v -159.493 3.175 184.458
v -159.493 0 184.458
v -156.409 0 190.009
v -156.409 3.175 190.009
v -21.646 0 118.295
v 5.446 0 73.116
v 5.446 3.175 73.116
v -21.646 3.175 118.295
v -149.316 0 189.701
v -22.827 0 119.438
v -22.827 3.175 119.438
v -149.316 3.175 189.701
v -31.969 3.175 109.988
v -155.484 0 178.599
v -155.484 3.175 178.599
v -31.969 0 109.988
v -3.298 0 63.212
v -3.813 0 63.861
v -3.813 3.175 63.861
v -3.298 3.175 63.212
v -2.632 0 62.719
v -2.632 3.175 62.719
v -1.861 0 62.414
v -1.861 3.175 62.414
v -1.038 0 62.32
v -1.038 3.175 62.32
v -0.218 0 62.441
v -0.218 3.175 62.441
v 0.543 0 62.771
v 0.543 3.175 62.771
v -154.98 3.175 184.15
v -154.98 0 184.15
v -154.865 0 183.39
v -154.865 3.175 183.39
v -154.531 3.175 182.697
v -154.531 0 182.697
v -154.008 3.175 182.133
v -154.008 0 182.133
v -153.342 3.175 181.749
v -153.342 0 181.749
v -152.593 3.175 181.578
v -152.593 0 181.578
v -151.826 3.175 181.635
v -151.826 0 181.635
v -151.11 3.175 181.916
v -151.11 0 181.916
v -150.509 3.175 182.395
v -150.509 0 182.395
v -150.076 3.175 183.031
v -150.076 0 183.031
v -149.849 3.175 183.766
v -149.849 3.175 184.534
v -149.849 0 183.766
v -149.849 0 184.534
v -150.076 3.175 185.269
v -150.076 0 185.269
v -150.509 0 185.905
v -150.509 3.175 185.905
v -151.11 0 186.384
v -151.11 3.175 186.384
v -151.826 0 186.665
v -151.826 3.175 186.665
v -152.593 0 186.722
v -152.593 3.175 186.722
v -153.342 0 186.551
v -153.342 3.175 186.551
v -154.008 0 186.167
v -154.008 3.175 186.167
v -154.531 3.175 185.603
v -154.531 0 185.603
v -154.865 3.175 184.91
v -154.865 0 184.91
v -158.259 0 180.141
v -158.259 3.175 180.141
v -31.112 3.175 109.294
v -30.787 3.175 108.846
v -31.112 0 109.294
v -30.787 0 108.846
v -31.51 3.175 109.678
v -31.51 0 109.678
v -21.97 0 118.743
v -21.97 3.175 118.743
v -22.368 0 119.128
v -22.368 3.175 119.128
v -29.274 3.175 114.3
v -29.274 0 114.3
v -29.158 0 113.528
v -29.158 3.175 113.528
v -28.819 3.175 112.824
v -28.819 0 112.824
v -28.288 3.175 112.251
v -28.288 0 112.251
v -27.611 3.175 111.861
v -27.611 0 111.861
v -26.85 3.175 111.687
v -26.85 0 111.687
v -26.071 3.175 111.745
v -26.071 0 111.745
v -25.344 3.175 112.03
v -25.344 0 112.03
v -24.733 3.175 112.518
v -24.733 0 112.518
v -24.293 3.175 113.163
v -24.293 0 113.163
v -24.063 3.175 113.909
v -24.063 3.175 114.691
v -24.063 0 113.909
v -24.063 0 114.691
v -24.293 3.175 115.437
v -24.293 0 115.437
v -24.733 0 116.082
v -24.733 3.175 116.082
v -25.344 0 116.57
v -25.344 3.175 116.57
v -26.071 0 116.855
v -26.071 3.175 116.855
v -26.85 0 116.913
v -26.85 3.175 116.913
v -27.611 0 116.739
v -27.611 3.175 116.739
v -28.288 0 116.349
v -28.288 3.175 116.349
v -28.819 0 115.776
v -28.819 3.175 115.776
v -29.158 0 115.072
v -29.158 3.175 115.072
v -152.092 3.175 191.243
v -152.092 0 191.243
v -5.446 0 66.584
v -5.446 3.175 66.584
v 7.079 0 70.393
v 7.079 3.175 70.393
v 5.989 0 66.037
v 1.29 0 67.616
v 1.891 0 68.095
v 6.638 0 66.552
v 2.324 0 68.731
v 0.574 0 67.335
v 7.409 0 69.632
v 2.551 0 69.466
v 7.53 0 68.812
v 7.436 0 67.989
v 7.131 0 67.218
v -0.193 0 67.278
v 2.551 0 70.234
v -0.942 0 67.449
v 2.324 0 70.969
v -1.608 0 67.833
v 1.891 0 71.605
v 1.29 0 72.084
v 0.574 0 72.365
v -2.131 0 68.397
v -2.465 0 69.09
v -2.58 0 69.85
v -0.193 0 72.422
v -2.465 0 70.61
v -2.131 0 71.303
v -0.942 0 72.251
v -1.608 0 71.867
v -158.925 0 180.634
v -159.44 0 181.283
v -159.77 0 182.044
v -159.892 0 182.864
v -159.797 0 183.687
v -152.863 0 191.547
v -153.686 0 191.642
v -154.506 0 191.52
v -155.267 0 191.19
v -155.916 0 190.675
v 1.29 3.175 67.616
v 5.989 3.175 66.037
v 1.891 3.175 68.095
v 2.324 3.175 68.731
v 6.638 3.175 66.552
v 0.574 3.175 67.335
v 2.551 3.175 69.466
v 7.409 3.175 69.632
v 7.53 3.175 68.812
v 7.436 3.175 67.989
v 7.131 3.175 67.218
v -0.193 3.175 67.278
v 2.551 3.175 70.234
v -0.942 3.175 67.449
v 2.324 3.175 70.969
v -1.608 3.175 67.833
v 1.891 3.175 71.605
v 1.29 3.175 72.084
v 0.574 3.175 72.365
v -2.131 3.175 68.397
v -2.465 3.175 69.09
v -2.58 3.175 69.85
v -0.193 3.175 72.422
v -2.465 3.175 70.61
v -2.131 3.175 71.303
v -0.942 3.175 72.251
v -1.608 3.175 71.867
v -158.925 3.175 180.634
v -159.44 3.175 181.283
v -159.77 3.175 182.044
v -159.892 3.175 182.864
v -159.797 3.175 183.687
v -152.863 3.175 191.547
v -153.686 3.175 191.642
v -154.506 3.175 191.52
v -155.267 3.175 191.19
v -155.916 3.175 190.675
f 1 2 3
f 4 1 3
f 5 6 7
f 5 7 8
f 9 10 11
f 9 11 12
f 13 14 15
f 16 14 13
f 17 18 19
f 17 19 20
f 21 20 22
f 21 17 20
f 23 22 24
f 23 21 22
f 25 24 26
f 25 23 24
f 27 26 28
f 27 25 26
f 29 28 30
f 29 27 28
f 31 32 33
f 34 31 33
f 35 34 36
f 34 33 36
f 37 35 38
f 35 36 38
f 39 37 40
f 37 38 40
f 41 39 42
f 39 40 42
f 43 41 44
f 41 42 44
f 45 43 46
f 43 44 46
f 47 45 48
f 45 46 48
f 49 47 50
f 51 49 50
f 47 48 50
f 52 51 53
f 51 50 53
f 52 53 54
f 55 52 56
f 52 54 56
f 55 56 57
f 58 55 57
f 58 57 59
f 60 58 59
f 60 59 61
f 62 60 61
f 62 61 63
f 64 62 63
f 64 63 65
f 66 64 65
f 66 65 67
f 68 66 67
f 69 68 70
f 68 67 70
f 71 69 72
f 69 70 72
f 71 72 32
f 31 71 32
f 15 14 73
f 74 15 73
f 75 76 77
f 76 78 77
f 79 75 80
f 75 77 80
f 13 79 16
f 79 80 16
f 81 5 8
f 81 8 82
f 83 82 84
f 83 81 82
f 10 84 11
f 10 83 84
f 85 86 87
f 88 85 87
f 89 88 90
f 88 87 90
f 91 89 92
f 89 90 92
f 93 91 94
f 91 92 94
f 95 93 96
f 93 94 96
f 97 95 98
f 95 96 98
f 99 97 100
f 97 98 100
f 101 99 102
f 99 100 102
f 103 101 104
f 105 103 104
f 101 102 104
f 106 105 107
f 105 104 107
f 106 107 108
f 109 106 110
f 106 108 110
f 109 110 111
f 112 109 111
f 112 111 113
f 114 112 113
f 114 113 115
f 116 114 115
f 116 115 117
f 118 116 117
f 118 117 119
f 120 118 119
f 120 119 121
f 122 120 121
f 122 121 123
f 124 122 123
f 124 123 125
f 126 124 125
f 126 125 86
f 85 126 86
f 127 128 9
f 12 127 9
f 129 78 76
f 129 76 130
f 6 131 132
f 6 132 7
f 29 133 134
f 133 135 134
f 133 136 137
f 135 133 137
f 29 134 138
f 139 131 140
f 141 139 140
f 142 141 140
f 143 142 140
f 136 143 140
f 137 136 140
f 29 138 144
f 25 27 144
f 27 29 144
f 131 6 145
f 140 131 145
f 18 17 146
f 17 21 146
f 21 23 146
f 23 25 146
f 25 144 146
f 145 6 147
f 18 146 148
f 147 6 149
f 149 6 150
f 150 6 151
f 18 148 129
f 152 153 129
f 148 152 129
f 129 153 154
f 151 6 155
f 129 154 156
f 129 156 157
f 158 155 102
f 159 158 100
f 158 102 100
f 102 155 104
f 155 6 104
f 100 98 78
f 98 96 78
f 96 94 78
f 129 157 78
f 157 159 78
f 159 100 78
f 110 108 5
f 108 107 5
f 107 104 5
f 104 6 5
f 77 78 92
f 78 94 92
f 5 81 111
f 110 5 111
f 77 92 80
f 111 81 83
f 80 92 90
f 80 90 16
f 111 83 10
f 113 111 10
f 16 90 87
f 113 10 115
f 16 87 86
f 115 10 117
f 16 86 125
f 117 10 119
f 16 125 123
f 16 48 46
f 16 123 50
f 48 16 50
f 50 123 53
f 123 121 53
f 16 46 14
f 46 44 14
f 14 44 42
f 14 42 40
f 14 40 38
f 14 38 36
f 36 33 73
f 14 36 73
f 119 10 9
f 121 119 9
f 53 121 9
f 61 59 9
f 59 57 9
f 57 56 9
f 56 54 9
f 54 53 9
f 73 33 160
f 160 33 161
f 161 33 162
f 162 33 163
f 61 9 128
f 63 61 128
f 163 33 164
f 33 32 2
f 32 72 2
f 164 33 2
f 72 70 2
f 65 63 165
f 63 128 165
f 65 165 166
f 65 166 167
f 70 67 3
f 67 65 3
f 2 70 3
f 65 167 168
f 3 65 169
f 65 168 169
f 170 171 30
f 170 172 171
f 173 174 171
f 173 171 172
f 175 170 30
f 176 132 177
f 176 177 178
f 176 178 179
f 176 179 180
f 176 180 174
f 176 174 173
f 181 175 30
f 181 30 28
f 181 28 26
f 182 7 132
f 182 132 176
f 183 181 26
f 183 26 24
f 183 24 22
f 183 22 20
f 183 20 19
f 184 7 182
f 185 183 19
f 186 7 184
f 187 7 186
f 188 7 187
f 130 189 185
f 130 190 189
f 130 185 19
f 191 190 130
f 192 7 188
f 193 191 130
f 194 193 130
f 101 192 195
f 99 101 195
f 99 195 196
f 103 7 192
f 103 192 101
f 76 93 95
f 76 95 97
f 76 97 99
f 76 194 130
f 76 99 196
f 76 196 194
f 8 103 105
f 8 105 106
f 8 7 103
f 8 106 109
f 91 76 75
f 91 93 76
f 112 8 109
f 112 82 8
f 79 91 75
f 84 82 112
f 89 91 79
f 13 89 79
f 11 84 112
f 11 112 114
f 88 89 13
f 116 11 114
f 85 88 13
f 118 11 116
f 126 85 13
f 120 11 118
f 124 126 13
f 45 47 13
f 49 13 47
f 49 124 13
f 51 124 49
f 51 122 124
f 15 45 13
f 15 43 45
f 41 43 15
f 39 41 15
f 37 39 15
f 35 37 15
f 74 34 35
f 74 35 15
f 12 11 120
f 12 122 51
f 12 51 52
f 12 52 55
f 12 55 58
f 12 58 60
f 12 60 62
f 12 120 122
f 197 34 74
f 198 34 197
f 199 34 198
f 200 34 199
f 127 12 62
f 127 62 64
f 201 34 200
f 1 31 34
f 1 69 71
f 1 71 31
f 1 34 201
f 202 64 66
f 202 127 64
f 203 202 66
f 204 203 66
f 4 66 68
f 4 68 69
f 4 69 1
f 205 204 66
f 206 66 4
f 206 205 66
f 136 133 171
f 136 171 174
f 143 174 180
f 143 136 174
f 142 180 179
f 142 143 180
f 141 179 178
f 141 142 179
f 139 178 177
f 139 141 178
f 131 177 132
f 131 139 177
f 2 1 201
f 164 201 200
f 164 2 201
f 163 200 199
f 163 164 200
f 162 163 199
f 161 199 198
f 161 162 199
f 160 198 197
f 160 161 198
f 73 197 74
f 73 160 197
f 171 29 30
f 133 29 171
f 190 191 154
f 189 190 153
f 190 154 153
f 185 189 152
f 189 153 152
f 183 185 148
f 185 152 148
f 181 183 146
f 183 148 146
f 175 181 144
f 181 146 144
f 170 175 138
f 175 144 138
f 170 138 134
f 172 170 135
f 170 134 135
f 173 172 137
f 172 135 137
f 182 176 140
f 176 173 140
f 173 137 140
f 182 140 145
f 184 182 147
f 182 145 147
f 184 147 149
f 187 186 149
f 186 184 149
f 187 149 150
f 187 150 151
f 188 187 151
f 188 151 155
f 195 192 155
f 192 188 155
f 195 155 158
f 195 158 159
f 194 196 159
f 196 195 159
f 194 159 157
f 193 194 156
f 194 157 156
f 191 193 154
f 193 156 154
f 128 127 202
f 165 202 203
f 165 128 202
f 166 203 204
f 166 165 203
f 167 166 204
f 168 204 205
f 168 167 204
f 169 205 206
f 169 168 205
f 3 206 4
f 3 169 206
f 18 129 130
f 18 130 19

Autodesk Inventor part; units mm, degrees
ref_plane "YZ Plane" through (0, 0, 0) normal (1, 0, 0) x (0, 1, 0)
ref_plane "XZ Plane" through (0, 0, 0) normal (0, 1, 0) x (-1, 0, 0)
ref_plane "XY Plane" through (0, 0, 0) normal (0, 0, 1) x (1, 0, 0)
sketch "Sketch1" plane through (0, 0, 0) normal (0, 1, 0) x (-1, 0, 0)
  line L0 (0, 76.2) -> (0, -76.2)
  line L1 (270.7338, 0) -> (-270.7338, 0)
  circle A0 centre (0, 69.85) radius 2.5797
  circle A1 centre (0, 44.45) radius 2.5797
  circle A2 centre (152.4, 158.75) radius 2.5797
  line L2 (158.75, 139.7) -> (158.75, 152.4)
  line L3 (158.75, 152.4) -> (273.05, 152.4)
  line L4 (273.05, 152.4) -> (273.05, 139.7)
  line L5 (273.05, 139.7) -> (158.75, 139.7)
  line L6 (146.05, 155.575) -> (158.75, 155.575)
  line L7 (158.75, 155.575) -> (158.75, 190.5)
  line L8 (158.75, 190.5) -> (146.05, 190.5)
  line L9 (146.05, 190.5) -> (146.05, 155.575)
  line L10 (158.75, 152.4) -> (273.05, 152.4)
  line L11 (273.05, 152.4) -> (273.05, 155.575)
  line L12 (273.05, 155.575) -> (158.75, 155.575)
  line L13 (158.75, 155.575) -> (158.75, 152.4)
  line L14 (158.75, 190.5) -> (273.05, 155.575)
  line L15 (266.7, 157.5153) -> (266.7, 155.575)
  circle A3 centre (152.4, 184.15) radius 2.5797
  circle A4 centre (152.4, 158.75) radius 2.5797
  line L16 (158.75, 155.575) -> (146.05, 155.575)
  line L17 (146.05, 155.575) -> (146.05, 152.4)
  line L18 (146.05, 152.4) -> (158.75, 152.4)
  line L19 (158.75, 152.4) -> (158.75, 155.575)
  line L20 (1.5875, 76.2) -> (-4.7625, 76.2)
  line L21 (-4.7625, 76.2) -> (-4.7625, -76.2)
  line L22 (-4.7625, -76.2) -> (1.5875, -76.2)
  line L23 (4.7625, -73.025) -> (4.7625, -41.275)
  line L24 (1.5875, -76.2) -> (1.5875, 76.2)
  line L25 (-1.5875, -76.2) -> (-1.5875, 76.2)
  circle A5 centre (0, -44.45) radius 2.5797
  circle A6 centre (0, -69.85) radius 2.5797
  line L26 (-4.7625, -38.1) -> (1.5875, -38.1)
  arc A7 (4.7625, -41.275) -> (1.5875, -38.1) centre (1.5875, -41.275) ccw
  arc A8 (1.5875, -76.2) -> (4.7625, -73.025) centre (1.5875, -73.025) ccw
  line L27 (-4.7625, 76.2) -> (4.7625, 76.2)
  line L28 (4.7625, 73.025) -> (4.7625, 41.275)
  line L29 (1.5875, 38.1) -> (-4.7625, 38.1)
  line L30 (-4.7625, 38.1) -> (-4.7625, 76.2)
  circle A9 centre (0, 69.85) radius 2.5797
  circle A10 centre (0, 44.45) radius 2.5797
  arc A11 (4.7625, 73.025) -> (1.5875, 76.2) centre (1.5875, 73.025) ccw
  arc A12 (1.5875, 38.1) -> (4.7625, 41.275) centre (1.5875, 41.275) ccw
  line L31 (152.4, 158.75) -> (27.7437, 90.2444)
  line L32 (27.7437, 90.2444) -> (0, 44.45)
  line L33 (5.4311, 41.1597) -> (-5.4311, 47.7403)
  line L34 (-5.4311, 47.7403) -> (22.7534, 94.2623)
  line L35 (32.6024, 100.1603) -> (38.8737, 96.361)
  line L36 (31.8523, 84.7712) -> (5.4311, 41.1597)
  line L37 (149.3417, 164.315) -> (155.4583, 153.185)
  line L38 (155.4583, 153.185) -> (33.0387, 85.9086)
  line L39 (21.1631, 79.3823) -> (17.6317, 85.8082)
  line L40 (23.9398, 95.3997) -> (149.3417, 164.315)
  arc A13 (23.9398, 95.3997) -> (22.7534, 94.2623) centre (25.4689, 92.6172) ccw
  arc A14 (33.0387, 85.9086) -> (31.8523, 84.7712) centre (34.5678, 83.1261) ccw
  circle A15 centre (152.4, 158.75) radius 2.5797
  circle A16 centre (0, 44.45) radius 2.5797
  line L41 (-5.4311, 47.7403) -> (5.4311, 41.1597)
  line L42 (5.4311, 41.1597) -> (3.7859, 38.4442)
  line L43 (-0.5748, 37.3738) -> (-6.0058, 40.6641)
  line L44 (-7.0762, 45.0248) -> (-5.4311, 47.7403)
  arc A17 (-7.0762, 45.0248) -> (-6.0058, 40.6641) centre (-4.3607, 43.3796) ccw
  arc A18 (-0.5748, 37.3738) -> (3.7859, 38.4442) centre (1.0704, 40.0893) ccw
  line L45 (149.3417, 164.315) -> (155.4583, 153.185)
  line L46 (155.4583, 153.185) -> (158.2408, 154.7141)
  line L47 (159.4942, 159.0258) -> (156.4359, 164.5908)
  line L48 (152.1242, 165.8442) -> (149.3417, 164.315)
  arc A19 (156.4359, 164.5908) -> (152.1242, 165.8442) centre (153.6534, 163.0616) ccw
  arc A20 (158.2408, 154.7141) -> (159.4942, 159.0258) centre (156.7116, 157.4966) ccw
  line L49 (152.4, 184.15) -> (26.6539, 114.3)
  line L50 (26.6539, 114.3) -> (0, 69.85)
  line L51 (5.4459, 66.5844) -> (-5.4459, 73.1156)
  line L52 (-5.4459, 73.1156) -> (21.6455, 118.2952)
  line L53 (31.4676, 124.2379) -> (37.756, 120.4671)
  line L54 (30.7873, 108.8455) -> (5.4459, 66.5844)
  line L55 (149.3165, 189.7011) -> (155.4835, 178.5989)
  line L56 (155.4835, 178.5989) -> (31.9686, 109.9883)
  line L57 (20.1227, 103.4081) -> (16.5622, 109.8179)
  line L58 (22.8267, 119.438) -> (149.3165, 189.7011)
  arc A21 (22.8267, 119.438) -> (21.6455, 118.2952) centre (24.3684, 116.6624) ccw
  arc A22 (31.9686, 109.9883) -> (30.7873, 108.8455) centre (33.5103, 107.2127) ccw
  circle A23 centre (152.4, 184.15) radius 2.5797
  circle A24 centre (26.6539, 114.3) radius 2.5797
  circle A25 centre (0, 69.85) radius 2.5797
  line L59 (-5.4459, 73.1156) -> (5.4459, 66.5844)
  line L60 (5.4459, 66.5844) -> (3.8132, 63.8614)
  line L61 (-0.5426, 62.7713) -> (-5.9886, 66.0368)
  line L62 (-7.0787, 70.3926) -> (-5.4459, 73.1156)
  arc A26 (-7.0787, 70.3926) -> (-5.9886, 66.0368) centre (-4.3558, 68.7598) ccw
  arc A27 (-0.5426, 62.7713) -> (3.8132, 63.8614) centre (1.0902, 65.4942) ccw
  line L63 (149.3165, 189.7011) -> (155.4835, 178.5989)
  line L64 (155.4835, 178.5989) -> (158.2591, 180.1407)
  line L65 (159.4928, 184.458) -> (156.4093, 190.0091)
  line L66 (152.092, 191.2428) -> (149.3165, 189.7011)
  arc A28 (156.4093, 190.0091) -> (152.092, 191.2428) centre (153.6338, 188.4673) ccw
  arc A29 (158.2591, 180.1407) -> (159.4928, 184.458) centre (156.7173, 182.9162) ccw
  line L67 (33.0039, 28.575) -> (33.0039, -28.575)
  line L68 (29.8289, -31.75) -> (23.4789, -31.75)
  line L69 (20.3039, -28.575) -> (20.3039, 28.575)
  line L70 (23.4789, 31.75) -> (29.8289, 31.75)
  line L71 (33.0039, 117.475) -> (33.0039, 22.225)
  line L72 (29.8289, 19.05) -> (23.4789, 19.05)
  line L73 (20.3039, 22.225) -> (20.3039, 117.475)
  line L74 (23.4789, 120.65) -> (29.8289, 120.65)
  circle A30 centre (26.6539, 25.4) radius 2.6206
  circle A31 centre (26.6539, -25.4) radius 2.6206
  circle A32 centre (26.6539, 25.4) radius 2.6206
  circle A33 centre (26.6539, 114.3) radius 2.6206
  arc A34 (33.0039, 28.575) -> (29.8289, 31.75) centre (29.8289, 28.575) ccw
  arc A35 (23.4789, 31.75) -> (20.3039, 28.575) centre (23.4789, 28.575) ccw
  arc A36 (20.3039, -28.575) -> (23.4789, -31.75) centre (23.4789, -28.575) ccw
  arc A37 (29.8289, -31.75) -> (33.0039, -28.575) centre (29.8289, -28.575) ccw
  arc A38 (20.3039, 22.225) -> (23.4789, 19.05) centre (23.4789, 22.225) ccw
  arc A39 (29.8289, 19.05) -> (33.0039, 22.225) centre (29.8289, 22.225) ccw
  arc A40 (33.0039, 117.475) -> (29.8289, 120.65) centre (29.8289, 117.475) ccw
  arc A41 (23.4789, 120.65) -> (20.3039, 117.475) centre (23.4789, 117.475) ccw
  point P0 (0, 0)
  point P1 (0, 0)
  point P2 (0, 44.45)
  point P3 (46.8631, 0)
  point P4 (2.1408, 35.7286)
  point P5 (161.0233, 156.2433)
  point P6 (2.1804, 61.1385)
  point P7 (161.0346, 181.6825)
  point P8 (33.0039, 31.75)
  point P9 (33.0039, -31.75)
  point P10 (33.0039, 120.65)
  point P11 (33.0039, 19.05)
  point P12 (20.3039, 19.05)
  point P13 (33.0039, 0)
  dimension "d4" = 5.1594
  dimension "d11" = 5.1594
  dimension "d17" = 152.4
  dimension "d56" = 12.7
  dimension "d57" = 114.3
  dimension "d58" = 3.175
  dimension "d61" = 6.35
  dimension "d63" = 5.1594
  dimension "d65" = 6.35
  dimension "d66" = 6.35
  dimension "d67" = 6.35
  dimension "d68" = 6.35
  dimension "d69" = 9.525
  dimension "d70" = 152.4
  dimension "d71" = 3.175
  dimension "d72" = 3.175
  dimension "d73" = 25.4
  dimension "d74" = 6.35
  dimension "d75" = 4.7625
  dimension "d76" = 4.7625
  dimension "d77" = 6.35
  dimension "d78" = 3.175
  dimension "d79" = 5.1594
  dimension "d80" = 25.4
  dimension "d81" = 6.35
  dimension "d82" = 4.7625
  dimension "d83" = 4.7625
  dimension "d84" = 6.35
  dimension "d85" = 3.175
  dimension "d89" = 190.5
  dimension "d92" = 150
  dimension "d94" = 142.24
  dimension "d95" = 12.7
  dimension "d96" = 3.175
  dimension "d97" = 6.35
  dimension "d98" = 3.175
  dimension "d99" = 6.35
  dimension "d100" = 3.175
  dimension "d101" = 5.1594
  dimension "d102" = 190.5
  dimension "d103" = 150
  dimension "d105" = 12.7
  dimension "d106" = 3.175
  dimension "d107" = 6.35
  dimension "d108" = 3.175
  dimension "d109" = 6.35
  dimension "d110" = 3.175
  dimension "d111" = 5.1594
  dimension "d112" = 12.7
  dimension "d113" = 12.7
  dimension "d114" = 76.2
  dimension "d115" = 4.7625
  dimension "d116" = 265.9713
  dimension "d117" = 42.1006
  dimension "d118" = 139.7
  dimension "d119" = 88.9
  dimension "d120" = 25.4
  dimension "d121" = 12.7
  dimension "d123" = 12.7
  dimension "d124" = 5.2413
  dimension "d125" = 6.35
  dimension "d126" = 6.35
  dimension "d127" = 6.35
  dimension "d128" = 6.35
sketch "Sketch2" plane through (0, 0, 0) normal (1, 0, 0) x (0, 1, 0)
  line L0 (0, 76.2) -> (0, -76.2)
  line L1 (270.7338, 0) -> (-270.7338, 0)
  circle A0 centre (0, 69.85) radius 2.5797
  circle A1 centre (0, 44.45) radius 2.5797
  circle A2 centre (188.7991, 19.05) radius 2.5797
  line L2 (195.1491, 0) -> (195.1491, 12.7)
  line L3 (195.1491, 12.7) -> (309.4491, 12.7)
  line L4 (309.4491, 12.7) -> (309.4491, 0)
  line L5 (309.4491, 0) -> (195.1491, 0)
  line L6 (182.4491, 15.875) -> (195.1491, 15.875)
  line L7 (195.1491, 15.875) -> (195.1491, 50.8)
  line L8 (195.1491, 50.8) -> (182.4491, 50.8)
  line L9 (182.4491, 50.8) -> (182.4491, 15.875)
  line L10 (195.1491, 12.7) -> (309.4491, 12.7)
  line L11 (309.4491, 12.7) -> (309.4491, 15.875)
  line L12 (309.4491, 15.875) -> (195.1491, 15.875)
  line L13 (195.1491, 15.875) -> (195.1491, 12.7)
  line L14 (195.1491, 50.8) -> (309.4491, 15.875)
  line L15 (303.0991, 17.8153) -> (303.0991, 15.875)
  circle A3 centre (188.7991, 44.45) radius 2.5797
  circle A4 centre (188.7991, 19.05) radius 2.5797
  line L16 (195.1491, 15.875) -> (182.4491, 15.875)
  line L17 (182.4491, 15.875) -> (182.4491, 12.7)
  line L18 (182.4491, 12.7) -> (195.1491, 12.7)
  line L19 (195.1491, 12.7) -> (195.1491, 15.875)
  line L20 (1.5875, 76.2) -> (-4.7625, 76.2)
  line L21 (-4.7625, 76.2) -> (-4.7625, -76.2)
  line L22 (-4.7625, -76.2) -> (1.5875, -76.2)
  line L23 (4.7625, -73.025) -> (4.7625, -41.275)
  line L24 (1.5875, -76.2) -> (1.5875, 76.2)
  line L25 (-1.5875, -76.2) -> (-1.5875, 76.2)
  circle A5 centre (0, -44.45) radius 2.5797
  circle A6 centre (0, -69.85) radius 2.5797
  line L26 (-4.7625, -38.1) -> (1.5875, -38.1)
  arc A7 (4.7625, -41.275) -> (1.5875, -38.1) centre (1.5875, -41.275) ccw
  arc A8 (1.5875, -76.2) -> (4.7625, -73.025) centre (1.5875, -73.025) ccw
  line L27 (-4.7625, 76.2) -> (4.7625, 76.2)
  line L28 (4.7625, 73.025) -> (4.7625, 41.275)
  line L29 (1.5875, 38.1) -> (-4.7625, 38.1)
  line L30 (-4.7625, 38.1) -> (-4.7625, 76.2)
  circle A9 centre (0, 69.85) radius 2.5797
  circle A10 centre (0, 44.45) radius 2.5797
  arc A11 (4.7625, 73.025) -> (1.5875, 76.2) centre (1.5875, 73.025) ccw
  arc A12 (1.5875, 38.1) -> (4.7625, 41.275) centre (1.5875, 41.275) ccw
  line L31 (188.7991, 19.05) -> (51.8933, 57.638)
  line L32 (51.8933, 57.638) -> (0, 44.45)
  line L33 (1.564, 38.2956) -> (-1.564, 50.6044)
  line L34 (-1.564, 50.6044) -> (51.1538, 64.0019)
  line L35 (62.311, 61.2991) -> (64.117, 54.1926)
  line L36 (50.9838, 50.855) -> (1.564, 38.2956)
  line L37 (190.5218, 25.1619) -> (187.0764, 12.9381)
  line L38 (187.0764, 12.9381) -> (52.6271, 50.8337)
  line L39 (39.5846, 54.5099) -> (41.5738, 61.5673)
  line L40 (52.7972, 63.9806) -> (190.5218, 25.1619)
  arc A13 (52.7972, 63.9806) -> (51.1538, 64.0019) centre (51.9358, 60.9247) ccw
  arc A14 (52.6271, 50.8337) -> (50.9838, 50.855) centre (51.7658, 47.7778) ccw
  circle A15 centre (188.7991, 19.05) radius 2.5797
  circle A16 centre (0, 44.45) radius 2.5797
  line L41 (-1.564, 50.6044) -> (1.564, 38.2956)
  line L42 (1.564, 38.2956) -> (-1.5131, 37.5136)
  line L43 (-5.3723, 39.8088) -> (-6.9364, 45.9631)
  line L44 (-4.6412, 49.8223) -> (-1.564, 50.6044)
  arc A17 (-4.6412, 49.8223) -> (-6.9364, 45.9631) centre (-3.8592, 46.7452) ccw
  arc A18 (-5.3723, 39.8088) -> (-1.5131, 37.5136) centre (-2.2952, 40.5908) ccw
  line L45 (190.5218, 25.1619) -> (187.0764, 12.9381)
  line L46 (187.0764, 12.9381) -> (190.1323, 12.0768)
  line L47 (194.0496, 14.2714) -> (195.7723, 20.3833)
  line L48 (193.5777, 24.3005) -> (190.5218, 25.1619)
  arc A19 (195.7723, 20.3833) -> (193.5777, 24.3005) centre (192.7163, 21.2446) ccw
  arc A20 (190.1323, 12.0768) -> (194.0496, 14.2714) centre (190.9937, 15.1327) ccw
  line L49 (194.0712, 39.6953) -> (195.7661, 45.8149)
  arc A21 (190.164, 37.4829) -> (194.0712, 39.6953) centre (191.0114, 40.5427) ccw
  arc A22 (195.7661, 45.8149) -> (193.5538, 49.7222) centre (192.7063, 46.6624) ccw
  line L50 (187.1042, 38.3304) -> (190.164, 37.4829)
  line L51 (193.5538, 49.7222) -> (190.494, 50.5696)
  circle A23 centre (188.7991, 44.45) radius 2.5797
  line L52 (190.494, 50.5696) -> (187.1042, 38.3304)
  line L53 (190.494, 50.5696) -> (187.1042, 38.3304)
  line L54 (60.5746, 86.5522) -> (62.4129, 79.4541)
  line L55 (187.1042, 38.3304) -> (50.9384, 76.043)
  line L56 (188.7991, 44.45) -> (50.1736, 82.8439)
  line L57 (51.0487, 89.1906) -> (190.494, 50.5696)
  line L58 (49.2949, 76.0568) -> (1.592, 63.7028)
  line L59 (-1.592, 75.9972) -> (49.4052, 89.2043)
  line L60 (50.1736, 82.8439) -> (0, 69.85)
  arc A24 (50.9384, 76.043) -> (49.2949, 76.0568) centre (50.0909, 72.9832) ccw
  arc A25 (51.0487, 89.1906) -> (49.4052, 89.2043) centre (50.2012, 86.1307) ccw
  circle A26 centre (50.1736, 82.8439) radius 2.5797
  line L61 (37.8792, 79.6599) -> (39.8363, 86.7262)
  line L62 (1.592, 63.7028) -> (-1.592, 75.9972)
  line L63 (1.592, 63.7028) -> (-1.4816, 62.9068)
  line L64 (-1.592, 75.9972) -> (1.592, 63.7028)
  circle A27 centre (0, 69.85) radius 2.5797
  line L65 (-4.6656, 75.2012) -> (-1.592, 75.9972)
  arc A28 (-5.3512, 65.1844) -> (-1.4816, 62.9068) centre (-2.2776, 65.9804) ccw
  line L66 (-5.3512, 65.1844) -> (-6.9432, 71.3316)
  arc A29 (-4.6656, 75.2012) -> (-6.9432, 71.3316) centre (-3.8696, 72.1276) ccw
  line L67 (124.3721, 28.575) -> (124.3721, -28.575)
  line L68 (121.1971, -31.75) -> (114.8471, -31.75)
  line L69 (111.6721, -28.575) -> (111.6721, 28.575)
  line L70 (114.8471, 31.75) -> (121.1971, 31.75)
  line L71 (51.8536, 89.7417) -> (124.5484, 28.1948)
  line L72 (124.92, 23.72) -> (120.8168, 18.8737)
  line L73 (116.3421, 18.5021) -> (43.6473, 80.0491)
  line L74 (43.2757, 84.5238) -> (47.3789, 89.3701)
  circle A30 centre (118.0221, 25.4) radius 2.6206
  circle A31 centre (118.0221, -25.4) radius 2.6206
  circle A32 centre (118.0221, 25.4) radius 2.6206
  circle A33 centre (50.1736, 82.8439) radius 2.6206
  arc A34 (124.3721, 28.575) -> (121.1971, 31.75) centre (121.1971, 28.575) ccw
  arc A35 (114.8471, 31.75) -> (111.6721, 28.575) centre (114.8471, 28.575) ccw
  arc A36 (111.6721, -28.575) -> (114.8471, -31.75) centre (114.8471, -28.575) ccw
  arc A37 (121.1971, -31.75) -> (124.3721, -28.575) centre (121.1971, -28.575) ccw
  arc A38 (116.3421, 18.5021) -> (120.8168, 18.8737) centre (118.3937, 20.9253) ccw
  arc A39 (124.92, 23.72) -> (124.5484, 28.1948) centre (122.4968, 25.7716) ccw
  arc A40 (51.8536, 89.7417) -> (47.3789, 89.3701) centre (49.802, 87.3186) ccw
  arc A41 (43.2757, 84.5238) -> (43.6473, 80.0491) centre (45.6989, 82.4723) ccw
  line L75 (50.1736, 82.8439) -> (118.0221, 25.4)
  line L76 (118.0221, -25.4) -> (118.0221, 25.4)
  line L77 (127.9831, -605.0736) -> (127.9831, -452.6736)
  line L78 (178.1568, -446.0297) -> (246.0052, -503.4736)
  line L79 (246.0052, -503.4736) -> (246.0052, -554.2736)
  line L80 (78.5716, -330.2354) -> (78.5716, -190.5354)
  line L81 (78.5716, -190.5354) -> (172.9711, -203.2354)
  line L82 (172.9711, -203.2354) -> (256.0081, -234.9854)
  line L83 (256.0081, -234.9854) -> (256.0081, -285.7854)
  line L84 (78.5716, -260.3854) -> (256.0081, -260.3854)
  line L85 (127.9831, -528.8736) -> (246.0052, -528.8736)
  line L86 (127.9831, -459.0236) -> (178.1568, -446.0297)
  line L87 (78.5716, -190.5354) -> (267.3706, -215.9354)
  line L88 (267.3706, -215.9354) -> (267.3706, -260.3854)
  point P0 (0, 0)
  point P1 (0, 0)
  point P2 (0, 44.45)
  point P3 (46.8631, 0)
  point P4 (-4.5903, 36.7316)
  point P5 (193.1883, 11.2155)
  point P6 (193.2238, 36.6355)
  point P7 (-4.5552, 62.1108)
  point P8 (124.3721, 31.75)
  point P9 (124.3721, -31.75)
  point P10 (49.4304, 91.7933)
  point P11 (126.9715, 26.1432)
  point P12 (118.7653, 16.4505)
  point P13 (124.3721, 0)
  point P14 (118.0221, 0)
  dimension "d145" = 5.1594
  dimension "d146" = 5.1594
  dimension "d147" = 152.4
  dimension "d148" = 12.7
  dimension "d149" = 114.3
  dimension "d150" = 3.175
  dimension "d151" = 6.35
  dimension "d152" = 5.1594
  dimension "d153" = 6.35
  dimension "d154" = 6.35
  dimension "d155" = 6.35
  dimension "d156" = 6.35
  dimension "d157" = 9.525
  dimension "d158" = 152.4
  dimension "d159" = 3.175
  dimension "d160" = 3.175
  dimension "d161" = 25.4
  dimension "d162" = 6.35
  dimension "d163" = 4.7625
  dimension "d164" = 4.7625
  dimension "d165" = 6.35
  dimension "d166" = 3.175
  dimension "d167" = 5.1594
  dimension "d168" = 25.4
  dimension "d169" = 6.35
  dimension "d170" = 4.7625
  dimension "d171" = 4.7625
  dimension "d172" = 6.35
  dimension "d173" = 3.175
  dimension "d174" = 190.5
  dimension "d175" = 150
  dimension "d176" = 142.24
  dimension "d177" = 12.7
  dimension "d178" = 3.175
  dimension "d179" = 6.35
  dimension "d180" = 3.175
  dimension "d181" = 6.35
  dimension "d182" = 3.175
  dimension "d183" = 5.1594
  dimension "d184" = 190.5
  dimension "d185" = 150
  dimension "d186" = 12.7
  dimension "d187" = 3.175
  dimension "d188" = 6.35
  dimension "d189" = 3.175
  dimension "d190" = 6.35
  dimension "d191" = 3.175
  dimension "d192" = 5.1594
  dimension "d193" = 12.7
  dimension "d194" = 12.7
  dimension "d195" = 76.2
  dimension "d196" = 4.7625
  dimension "d197" = 265.9713
  dimension "d198" = 42.1006
  dimension "d199" = 139.7
  dimension "d200" = 88.9
  dimension "d201" = 25.4
  dimension "d202" = 12.7
  dimension "d203" = 12.7
  dimension "d204" = 5.2413
  dimension "d205" = 6.35
  dimension "d206" = 6.35
  dimension "d207" = 6.35
  dimension "d208" = 6.35
extrude "Extrusion1" add sketch "Sketch1" along normal blind 3.175 contours L20 L24 L50 A0 L0 | L20 L52 L57 L50 L27 | L0 A0 L25 L20 | A11 L50 L24 | L27 L50 A11 | L25 A0 L51 L21 L52 L20 | L50 L24 A0 | L50 A11 L28 L51 A0 L24 | L50 L73 L54 L51 L28 A11 | A0 L24 A27 L0 | L0 A27 L61 L25 A0 | A0 L25 L61 L21 L51 | L57 L52 L73 L50 | L21 L51 L52 | A0 L51 L28 L60 A27 L24 | L21 L61 A26 L62 L51 | L73 L52 A21 L58 L74 A40 L49 A33 L50 | L50 A33 L49 A40 L71 L56 A22 L54 L73 | L51 L60 L28 | A40 L74 L58 L53 L49 | L49 L9 L56 L71 A40 | L53 L58 L9 L49 | L49 A3 L55 L56 L9 | L9 L58 L55 A3 L49 | L55 A3 L66 L8 A28 L65 L7 A29 L64 | L66 A28 L8 | L7 L65 A29
properties part number "Outer Gripper Bar"
